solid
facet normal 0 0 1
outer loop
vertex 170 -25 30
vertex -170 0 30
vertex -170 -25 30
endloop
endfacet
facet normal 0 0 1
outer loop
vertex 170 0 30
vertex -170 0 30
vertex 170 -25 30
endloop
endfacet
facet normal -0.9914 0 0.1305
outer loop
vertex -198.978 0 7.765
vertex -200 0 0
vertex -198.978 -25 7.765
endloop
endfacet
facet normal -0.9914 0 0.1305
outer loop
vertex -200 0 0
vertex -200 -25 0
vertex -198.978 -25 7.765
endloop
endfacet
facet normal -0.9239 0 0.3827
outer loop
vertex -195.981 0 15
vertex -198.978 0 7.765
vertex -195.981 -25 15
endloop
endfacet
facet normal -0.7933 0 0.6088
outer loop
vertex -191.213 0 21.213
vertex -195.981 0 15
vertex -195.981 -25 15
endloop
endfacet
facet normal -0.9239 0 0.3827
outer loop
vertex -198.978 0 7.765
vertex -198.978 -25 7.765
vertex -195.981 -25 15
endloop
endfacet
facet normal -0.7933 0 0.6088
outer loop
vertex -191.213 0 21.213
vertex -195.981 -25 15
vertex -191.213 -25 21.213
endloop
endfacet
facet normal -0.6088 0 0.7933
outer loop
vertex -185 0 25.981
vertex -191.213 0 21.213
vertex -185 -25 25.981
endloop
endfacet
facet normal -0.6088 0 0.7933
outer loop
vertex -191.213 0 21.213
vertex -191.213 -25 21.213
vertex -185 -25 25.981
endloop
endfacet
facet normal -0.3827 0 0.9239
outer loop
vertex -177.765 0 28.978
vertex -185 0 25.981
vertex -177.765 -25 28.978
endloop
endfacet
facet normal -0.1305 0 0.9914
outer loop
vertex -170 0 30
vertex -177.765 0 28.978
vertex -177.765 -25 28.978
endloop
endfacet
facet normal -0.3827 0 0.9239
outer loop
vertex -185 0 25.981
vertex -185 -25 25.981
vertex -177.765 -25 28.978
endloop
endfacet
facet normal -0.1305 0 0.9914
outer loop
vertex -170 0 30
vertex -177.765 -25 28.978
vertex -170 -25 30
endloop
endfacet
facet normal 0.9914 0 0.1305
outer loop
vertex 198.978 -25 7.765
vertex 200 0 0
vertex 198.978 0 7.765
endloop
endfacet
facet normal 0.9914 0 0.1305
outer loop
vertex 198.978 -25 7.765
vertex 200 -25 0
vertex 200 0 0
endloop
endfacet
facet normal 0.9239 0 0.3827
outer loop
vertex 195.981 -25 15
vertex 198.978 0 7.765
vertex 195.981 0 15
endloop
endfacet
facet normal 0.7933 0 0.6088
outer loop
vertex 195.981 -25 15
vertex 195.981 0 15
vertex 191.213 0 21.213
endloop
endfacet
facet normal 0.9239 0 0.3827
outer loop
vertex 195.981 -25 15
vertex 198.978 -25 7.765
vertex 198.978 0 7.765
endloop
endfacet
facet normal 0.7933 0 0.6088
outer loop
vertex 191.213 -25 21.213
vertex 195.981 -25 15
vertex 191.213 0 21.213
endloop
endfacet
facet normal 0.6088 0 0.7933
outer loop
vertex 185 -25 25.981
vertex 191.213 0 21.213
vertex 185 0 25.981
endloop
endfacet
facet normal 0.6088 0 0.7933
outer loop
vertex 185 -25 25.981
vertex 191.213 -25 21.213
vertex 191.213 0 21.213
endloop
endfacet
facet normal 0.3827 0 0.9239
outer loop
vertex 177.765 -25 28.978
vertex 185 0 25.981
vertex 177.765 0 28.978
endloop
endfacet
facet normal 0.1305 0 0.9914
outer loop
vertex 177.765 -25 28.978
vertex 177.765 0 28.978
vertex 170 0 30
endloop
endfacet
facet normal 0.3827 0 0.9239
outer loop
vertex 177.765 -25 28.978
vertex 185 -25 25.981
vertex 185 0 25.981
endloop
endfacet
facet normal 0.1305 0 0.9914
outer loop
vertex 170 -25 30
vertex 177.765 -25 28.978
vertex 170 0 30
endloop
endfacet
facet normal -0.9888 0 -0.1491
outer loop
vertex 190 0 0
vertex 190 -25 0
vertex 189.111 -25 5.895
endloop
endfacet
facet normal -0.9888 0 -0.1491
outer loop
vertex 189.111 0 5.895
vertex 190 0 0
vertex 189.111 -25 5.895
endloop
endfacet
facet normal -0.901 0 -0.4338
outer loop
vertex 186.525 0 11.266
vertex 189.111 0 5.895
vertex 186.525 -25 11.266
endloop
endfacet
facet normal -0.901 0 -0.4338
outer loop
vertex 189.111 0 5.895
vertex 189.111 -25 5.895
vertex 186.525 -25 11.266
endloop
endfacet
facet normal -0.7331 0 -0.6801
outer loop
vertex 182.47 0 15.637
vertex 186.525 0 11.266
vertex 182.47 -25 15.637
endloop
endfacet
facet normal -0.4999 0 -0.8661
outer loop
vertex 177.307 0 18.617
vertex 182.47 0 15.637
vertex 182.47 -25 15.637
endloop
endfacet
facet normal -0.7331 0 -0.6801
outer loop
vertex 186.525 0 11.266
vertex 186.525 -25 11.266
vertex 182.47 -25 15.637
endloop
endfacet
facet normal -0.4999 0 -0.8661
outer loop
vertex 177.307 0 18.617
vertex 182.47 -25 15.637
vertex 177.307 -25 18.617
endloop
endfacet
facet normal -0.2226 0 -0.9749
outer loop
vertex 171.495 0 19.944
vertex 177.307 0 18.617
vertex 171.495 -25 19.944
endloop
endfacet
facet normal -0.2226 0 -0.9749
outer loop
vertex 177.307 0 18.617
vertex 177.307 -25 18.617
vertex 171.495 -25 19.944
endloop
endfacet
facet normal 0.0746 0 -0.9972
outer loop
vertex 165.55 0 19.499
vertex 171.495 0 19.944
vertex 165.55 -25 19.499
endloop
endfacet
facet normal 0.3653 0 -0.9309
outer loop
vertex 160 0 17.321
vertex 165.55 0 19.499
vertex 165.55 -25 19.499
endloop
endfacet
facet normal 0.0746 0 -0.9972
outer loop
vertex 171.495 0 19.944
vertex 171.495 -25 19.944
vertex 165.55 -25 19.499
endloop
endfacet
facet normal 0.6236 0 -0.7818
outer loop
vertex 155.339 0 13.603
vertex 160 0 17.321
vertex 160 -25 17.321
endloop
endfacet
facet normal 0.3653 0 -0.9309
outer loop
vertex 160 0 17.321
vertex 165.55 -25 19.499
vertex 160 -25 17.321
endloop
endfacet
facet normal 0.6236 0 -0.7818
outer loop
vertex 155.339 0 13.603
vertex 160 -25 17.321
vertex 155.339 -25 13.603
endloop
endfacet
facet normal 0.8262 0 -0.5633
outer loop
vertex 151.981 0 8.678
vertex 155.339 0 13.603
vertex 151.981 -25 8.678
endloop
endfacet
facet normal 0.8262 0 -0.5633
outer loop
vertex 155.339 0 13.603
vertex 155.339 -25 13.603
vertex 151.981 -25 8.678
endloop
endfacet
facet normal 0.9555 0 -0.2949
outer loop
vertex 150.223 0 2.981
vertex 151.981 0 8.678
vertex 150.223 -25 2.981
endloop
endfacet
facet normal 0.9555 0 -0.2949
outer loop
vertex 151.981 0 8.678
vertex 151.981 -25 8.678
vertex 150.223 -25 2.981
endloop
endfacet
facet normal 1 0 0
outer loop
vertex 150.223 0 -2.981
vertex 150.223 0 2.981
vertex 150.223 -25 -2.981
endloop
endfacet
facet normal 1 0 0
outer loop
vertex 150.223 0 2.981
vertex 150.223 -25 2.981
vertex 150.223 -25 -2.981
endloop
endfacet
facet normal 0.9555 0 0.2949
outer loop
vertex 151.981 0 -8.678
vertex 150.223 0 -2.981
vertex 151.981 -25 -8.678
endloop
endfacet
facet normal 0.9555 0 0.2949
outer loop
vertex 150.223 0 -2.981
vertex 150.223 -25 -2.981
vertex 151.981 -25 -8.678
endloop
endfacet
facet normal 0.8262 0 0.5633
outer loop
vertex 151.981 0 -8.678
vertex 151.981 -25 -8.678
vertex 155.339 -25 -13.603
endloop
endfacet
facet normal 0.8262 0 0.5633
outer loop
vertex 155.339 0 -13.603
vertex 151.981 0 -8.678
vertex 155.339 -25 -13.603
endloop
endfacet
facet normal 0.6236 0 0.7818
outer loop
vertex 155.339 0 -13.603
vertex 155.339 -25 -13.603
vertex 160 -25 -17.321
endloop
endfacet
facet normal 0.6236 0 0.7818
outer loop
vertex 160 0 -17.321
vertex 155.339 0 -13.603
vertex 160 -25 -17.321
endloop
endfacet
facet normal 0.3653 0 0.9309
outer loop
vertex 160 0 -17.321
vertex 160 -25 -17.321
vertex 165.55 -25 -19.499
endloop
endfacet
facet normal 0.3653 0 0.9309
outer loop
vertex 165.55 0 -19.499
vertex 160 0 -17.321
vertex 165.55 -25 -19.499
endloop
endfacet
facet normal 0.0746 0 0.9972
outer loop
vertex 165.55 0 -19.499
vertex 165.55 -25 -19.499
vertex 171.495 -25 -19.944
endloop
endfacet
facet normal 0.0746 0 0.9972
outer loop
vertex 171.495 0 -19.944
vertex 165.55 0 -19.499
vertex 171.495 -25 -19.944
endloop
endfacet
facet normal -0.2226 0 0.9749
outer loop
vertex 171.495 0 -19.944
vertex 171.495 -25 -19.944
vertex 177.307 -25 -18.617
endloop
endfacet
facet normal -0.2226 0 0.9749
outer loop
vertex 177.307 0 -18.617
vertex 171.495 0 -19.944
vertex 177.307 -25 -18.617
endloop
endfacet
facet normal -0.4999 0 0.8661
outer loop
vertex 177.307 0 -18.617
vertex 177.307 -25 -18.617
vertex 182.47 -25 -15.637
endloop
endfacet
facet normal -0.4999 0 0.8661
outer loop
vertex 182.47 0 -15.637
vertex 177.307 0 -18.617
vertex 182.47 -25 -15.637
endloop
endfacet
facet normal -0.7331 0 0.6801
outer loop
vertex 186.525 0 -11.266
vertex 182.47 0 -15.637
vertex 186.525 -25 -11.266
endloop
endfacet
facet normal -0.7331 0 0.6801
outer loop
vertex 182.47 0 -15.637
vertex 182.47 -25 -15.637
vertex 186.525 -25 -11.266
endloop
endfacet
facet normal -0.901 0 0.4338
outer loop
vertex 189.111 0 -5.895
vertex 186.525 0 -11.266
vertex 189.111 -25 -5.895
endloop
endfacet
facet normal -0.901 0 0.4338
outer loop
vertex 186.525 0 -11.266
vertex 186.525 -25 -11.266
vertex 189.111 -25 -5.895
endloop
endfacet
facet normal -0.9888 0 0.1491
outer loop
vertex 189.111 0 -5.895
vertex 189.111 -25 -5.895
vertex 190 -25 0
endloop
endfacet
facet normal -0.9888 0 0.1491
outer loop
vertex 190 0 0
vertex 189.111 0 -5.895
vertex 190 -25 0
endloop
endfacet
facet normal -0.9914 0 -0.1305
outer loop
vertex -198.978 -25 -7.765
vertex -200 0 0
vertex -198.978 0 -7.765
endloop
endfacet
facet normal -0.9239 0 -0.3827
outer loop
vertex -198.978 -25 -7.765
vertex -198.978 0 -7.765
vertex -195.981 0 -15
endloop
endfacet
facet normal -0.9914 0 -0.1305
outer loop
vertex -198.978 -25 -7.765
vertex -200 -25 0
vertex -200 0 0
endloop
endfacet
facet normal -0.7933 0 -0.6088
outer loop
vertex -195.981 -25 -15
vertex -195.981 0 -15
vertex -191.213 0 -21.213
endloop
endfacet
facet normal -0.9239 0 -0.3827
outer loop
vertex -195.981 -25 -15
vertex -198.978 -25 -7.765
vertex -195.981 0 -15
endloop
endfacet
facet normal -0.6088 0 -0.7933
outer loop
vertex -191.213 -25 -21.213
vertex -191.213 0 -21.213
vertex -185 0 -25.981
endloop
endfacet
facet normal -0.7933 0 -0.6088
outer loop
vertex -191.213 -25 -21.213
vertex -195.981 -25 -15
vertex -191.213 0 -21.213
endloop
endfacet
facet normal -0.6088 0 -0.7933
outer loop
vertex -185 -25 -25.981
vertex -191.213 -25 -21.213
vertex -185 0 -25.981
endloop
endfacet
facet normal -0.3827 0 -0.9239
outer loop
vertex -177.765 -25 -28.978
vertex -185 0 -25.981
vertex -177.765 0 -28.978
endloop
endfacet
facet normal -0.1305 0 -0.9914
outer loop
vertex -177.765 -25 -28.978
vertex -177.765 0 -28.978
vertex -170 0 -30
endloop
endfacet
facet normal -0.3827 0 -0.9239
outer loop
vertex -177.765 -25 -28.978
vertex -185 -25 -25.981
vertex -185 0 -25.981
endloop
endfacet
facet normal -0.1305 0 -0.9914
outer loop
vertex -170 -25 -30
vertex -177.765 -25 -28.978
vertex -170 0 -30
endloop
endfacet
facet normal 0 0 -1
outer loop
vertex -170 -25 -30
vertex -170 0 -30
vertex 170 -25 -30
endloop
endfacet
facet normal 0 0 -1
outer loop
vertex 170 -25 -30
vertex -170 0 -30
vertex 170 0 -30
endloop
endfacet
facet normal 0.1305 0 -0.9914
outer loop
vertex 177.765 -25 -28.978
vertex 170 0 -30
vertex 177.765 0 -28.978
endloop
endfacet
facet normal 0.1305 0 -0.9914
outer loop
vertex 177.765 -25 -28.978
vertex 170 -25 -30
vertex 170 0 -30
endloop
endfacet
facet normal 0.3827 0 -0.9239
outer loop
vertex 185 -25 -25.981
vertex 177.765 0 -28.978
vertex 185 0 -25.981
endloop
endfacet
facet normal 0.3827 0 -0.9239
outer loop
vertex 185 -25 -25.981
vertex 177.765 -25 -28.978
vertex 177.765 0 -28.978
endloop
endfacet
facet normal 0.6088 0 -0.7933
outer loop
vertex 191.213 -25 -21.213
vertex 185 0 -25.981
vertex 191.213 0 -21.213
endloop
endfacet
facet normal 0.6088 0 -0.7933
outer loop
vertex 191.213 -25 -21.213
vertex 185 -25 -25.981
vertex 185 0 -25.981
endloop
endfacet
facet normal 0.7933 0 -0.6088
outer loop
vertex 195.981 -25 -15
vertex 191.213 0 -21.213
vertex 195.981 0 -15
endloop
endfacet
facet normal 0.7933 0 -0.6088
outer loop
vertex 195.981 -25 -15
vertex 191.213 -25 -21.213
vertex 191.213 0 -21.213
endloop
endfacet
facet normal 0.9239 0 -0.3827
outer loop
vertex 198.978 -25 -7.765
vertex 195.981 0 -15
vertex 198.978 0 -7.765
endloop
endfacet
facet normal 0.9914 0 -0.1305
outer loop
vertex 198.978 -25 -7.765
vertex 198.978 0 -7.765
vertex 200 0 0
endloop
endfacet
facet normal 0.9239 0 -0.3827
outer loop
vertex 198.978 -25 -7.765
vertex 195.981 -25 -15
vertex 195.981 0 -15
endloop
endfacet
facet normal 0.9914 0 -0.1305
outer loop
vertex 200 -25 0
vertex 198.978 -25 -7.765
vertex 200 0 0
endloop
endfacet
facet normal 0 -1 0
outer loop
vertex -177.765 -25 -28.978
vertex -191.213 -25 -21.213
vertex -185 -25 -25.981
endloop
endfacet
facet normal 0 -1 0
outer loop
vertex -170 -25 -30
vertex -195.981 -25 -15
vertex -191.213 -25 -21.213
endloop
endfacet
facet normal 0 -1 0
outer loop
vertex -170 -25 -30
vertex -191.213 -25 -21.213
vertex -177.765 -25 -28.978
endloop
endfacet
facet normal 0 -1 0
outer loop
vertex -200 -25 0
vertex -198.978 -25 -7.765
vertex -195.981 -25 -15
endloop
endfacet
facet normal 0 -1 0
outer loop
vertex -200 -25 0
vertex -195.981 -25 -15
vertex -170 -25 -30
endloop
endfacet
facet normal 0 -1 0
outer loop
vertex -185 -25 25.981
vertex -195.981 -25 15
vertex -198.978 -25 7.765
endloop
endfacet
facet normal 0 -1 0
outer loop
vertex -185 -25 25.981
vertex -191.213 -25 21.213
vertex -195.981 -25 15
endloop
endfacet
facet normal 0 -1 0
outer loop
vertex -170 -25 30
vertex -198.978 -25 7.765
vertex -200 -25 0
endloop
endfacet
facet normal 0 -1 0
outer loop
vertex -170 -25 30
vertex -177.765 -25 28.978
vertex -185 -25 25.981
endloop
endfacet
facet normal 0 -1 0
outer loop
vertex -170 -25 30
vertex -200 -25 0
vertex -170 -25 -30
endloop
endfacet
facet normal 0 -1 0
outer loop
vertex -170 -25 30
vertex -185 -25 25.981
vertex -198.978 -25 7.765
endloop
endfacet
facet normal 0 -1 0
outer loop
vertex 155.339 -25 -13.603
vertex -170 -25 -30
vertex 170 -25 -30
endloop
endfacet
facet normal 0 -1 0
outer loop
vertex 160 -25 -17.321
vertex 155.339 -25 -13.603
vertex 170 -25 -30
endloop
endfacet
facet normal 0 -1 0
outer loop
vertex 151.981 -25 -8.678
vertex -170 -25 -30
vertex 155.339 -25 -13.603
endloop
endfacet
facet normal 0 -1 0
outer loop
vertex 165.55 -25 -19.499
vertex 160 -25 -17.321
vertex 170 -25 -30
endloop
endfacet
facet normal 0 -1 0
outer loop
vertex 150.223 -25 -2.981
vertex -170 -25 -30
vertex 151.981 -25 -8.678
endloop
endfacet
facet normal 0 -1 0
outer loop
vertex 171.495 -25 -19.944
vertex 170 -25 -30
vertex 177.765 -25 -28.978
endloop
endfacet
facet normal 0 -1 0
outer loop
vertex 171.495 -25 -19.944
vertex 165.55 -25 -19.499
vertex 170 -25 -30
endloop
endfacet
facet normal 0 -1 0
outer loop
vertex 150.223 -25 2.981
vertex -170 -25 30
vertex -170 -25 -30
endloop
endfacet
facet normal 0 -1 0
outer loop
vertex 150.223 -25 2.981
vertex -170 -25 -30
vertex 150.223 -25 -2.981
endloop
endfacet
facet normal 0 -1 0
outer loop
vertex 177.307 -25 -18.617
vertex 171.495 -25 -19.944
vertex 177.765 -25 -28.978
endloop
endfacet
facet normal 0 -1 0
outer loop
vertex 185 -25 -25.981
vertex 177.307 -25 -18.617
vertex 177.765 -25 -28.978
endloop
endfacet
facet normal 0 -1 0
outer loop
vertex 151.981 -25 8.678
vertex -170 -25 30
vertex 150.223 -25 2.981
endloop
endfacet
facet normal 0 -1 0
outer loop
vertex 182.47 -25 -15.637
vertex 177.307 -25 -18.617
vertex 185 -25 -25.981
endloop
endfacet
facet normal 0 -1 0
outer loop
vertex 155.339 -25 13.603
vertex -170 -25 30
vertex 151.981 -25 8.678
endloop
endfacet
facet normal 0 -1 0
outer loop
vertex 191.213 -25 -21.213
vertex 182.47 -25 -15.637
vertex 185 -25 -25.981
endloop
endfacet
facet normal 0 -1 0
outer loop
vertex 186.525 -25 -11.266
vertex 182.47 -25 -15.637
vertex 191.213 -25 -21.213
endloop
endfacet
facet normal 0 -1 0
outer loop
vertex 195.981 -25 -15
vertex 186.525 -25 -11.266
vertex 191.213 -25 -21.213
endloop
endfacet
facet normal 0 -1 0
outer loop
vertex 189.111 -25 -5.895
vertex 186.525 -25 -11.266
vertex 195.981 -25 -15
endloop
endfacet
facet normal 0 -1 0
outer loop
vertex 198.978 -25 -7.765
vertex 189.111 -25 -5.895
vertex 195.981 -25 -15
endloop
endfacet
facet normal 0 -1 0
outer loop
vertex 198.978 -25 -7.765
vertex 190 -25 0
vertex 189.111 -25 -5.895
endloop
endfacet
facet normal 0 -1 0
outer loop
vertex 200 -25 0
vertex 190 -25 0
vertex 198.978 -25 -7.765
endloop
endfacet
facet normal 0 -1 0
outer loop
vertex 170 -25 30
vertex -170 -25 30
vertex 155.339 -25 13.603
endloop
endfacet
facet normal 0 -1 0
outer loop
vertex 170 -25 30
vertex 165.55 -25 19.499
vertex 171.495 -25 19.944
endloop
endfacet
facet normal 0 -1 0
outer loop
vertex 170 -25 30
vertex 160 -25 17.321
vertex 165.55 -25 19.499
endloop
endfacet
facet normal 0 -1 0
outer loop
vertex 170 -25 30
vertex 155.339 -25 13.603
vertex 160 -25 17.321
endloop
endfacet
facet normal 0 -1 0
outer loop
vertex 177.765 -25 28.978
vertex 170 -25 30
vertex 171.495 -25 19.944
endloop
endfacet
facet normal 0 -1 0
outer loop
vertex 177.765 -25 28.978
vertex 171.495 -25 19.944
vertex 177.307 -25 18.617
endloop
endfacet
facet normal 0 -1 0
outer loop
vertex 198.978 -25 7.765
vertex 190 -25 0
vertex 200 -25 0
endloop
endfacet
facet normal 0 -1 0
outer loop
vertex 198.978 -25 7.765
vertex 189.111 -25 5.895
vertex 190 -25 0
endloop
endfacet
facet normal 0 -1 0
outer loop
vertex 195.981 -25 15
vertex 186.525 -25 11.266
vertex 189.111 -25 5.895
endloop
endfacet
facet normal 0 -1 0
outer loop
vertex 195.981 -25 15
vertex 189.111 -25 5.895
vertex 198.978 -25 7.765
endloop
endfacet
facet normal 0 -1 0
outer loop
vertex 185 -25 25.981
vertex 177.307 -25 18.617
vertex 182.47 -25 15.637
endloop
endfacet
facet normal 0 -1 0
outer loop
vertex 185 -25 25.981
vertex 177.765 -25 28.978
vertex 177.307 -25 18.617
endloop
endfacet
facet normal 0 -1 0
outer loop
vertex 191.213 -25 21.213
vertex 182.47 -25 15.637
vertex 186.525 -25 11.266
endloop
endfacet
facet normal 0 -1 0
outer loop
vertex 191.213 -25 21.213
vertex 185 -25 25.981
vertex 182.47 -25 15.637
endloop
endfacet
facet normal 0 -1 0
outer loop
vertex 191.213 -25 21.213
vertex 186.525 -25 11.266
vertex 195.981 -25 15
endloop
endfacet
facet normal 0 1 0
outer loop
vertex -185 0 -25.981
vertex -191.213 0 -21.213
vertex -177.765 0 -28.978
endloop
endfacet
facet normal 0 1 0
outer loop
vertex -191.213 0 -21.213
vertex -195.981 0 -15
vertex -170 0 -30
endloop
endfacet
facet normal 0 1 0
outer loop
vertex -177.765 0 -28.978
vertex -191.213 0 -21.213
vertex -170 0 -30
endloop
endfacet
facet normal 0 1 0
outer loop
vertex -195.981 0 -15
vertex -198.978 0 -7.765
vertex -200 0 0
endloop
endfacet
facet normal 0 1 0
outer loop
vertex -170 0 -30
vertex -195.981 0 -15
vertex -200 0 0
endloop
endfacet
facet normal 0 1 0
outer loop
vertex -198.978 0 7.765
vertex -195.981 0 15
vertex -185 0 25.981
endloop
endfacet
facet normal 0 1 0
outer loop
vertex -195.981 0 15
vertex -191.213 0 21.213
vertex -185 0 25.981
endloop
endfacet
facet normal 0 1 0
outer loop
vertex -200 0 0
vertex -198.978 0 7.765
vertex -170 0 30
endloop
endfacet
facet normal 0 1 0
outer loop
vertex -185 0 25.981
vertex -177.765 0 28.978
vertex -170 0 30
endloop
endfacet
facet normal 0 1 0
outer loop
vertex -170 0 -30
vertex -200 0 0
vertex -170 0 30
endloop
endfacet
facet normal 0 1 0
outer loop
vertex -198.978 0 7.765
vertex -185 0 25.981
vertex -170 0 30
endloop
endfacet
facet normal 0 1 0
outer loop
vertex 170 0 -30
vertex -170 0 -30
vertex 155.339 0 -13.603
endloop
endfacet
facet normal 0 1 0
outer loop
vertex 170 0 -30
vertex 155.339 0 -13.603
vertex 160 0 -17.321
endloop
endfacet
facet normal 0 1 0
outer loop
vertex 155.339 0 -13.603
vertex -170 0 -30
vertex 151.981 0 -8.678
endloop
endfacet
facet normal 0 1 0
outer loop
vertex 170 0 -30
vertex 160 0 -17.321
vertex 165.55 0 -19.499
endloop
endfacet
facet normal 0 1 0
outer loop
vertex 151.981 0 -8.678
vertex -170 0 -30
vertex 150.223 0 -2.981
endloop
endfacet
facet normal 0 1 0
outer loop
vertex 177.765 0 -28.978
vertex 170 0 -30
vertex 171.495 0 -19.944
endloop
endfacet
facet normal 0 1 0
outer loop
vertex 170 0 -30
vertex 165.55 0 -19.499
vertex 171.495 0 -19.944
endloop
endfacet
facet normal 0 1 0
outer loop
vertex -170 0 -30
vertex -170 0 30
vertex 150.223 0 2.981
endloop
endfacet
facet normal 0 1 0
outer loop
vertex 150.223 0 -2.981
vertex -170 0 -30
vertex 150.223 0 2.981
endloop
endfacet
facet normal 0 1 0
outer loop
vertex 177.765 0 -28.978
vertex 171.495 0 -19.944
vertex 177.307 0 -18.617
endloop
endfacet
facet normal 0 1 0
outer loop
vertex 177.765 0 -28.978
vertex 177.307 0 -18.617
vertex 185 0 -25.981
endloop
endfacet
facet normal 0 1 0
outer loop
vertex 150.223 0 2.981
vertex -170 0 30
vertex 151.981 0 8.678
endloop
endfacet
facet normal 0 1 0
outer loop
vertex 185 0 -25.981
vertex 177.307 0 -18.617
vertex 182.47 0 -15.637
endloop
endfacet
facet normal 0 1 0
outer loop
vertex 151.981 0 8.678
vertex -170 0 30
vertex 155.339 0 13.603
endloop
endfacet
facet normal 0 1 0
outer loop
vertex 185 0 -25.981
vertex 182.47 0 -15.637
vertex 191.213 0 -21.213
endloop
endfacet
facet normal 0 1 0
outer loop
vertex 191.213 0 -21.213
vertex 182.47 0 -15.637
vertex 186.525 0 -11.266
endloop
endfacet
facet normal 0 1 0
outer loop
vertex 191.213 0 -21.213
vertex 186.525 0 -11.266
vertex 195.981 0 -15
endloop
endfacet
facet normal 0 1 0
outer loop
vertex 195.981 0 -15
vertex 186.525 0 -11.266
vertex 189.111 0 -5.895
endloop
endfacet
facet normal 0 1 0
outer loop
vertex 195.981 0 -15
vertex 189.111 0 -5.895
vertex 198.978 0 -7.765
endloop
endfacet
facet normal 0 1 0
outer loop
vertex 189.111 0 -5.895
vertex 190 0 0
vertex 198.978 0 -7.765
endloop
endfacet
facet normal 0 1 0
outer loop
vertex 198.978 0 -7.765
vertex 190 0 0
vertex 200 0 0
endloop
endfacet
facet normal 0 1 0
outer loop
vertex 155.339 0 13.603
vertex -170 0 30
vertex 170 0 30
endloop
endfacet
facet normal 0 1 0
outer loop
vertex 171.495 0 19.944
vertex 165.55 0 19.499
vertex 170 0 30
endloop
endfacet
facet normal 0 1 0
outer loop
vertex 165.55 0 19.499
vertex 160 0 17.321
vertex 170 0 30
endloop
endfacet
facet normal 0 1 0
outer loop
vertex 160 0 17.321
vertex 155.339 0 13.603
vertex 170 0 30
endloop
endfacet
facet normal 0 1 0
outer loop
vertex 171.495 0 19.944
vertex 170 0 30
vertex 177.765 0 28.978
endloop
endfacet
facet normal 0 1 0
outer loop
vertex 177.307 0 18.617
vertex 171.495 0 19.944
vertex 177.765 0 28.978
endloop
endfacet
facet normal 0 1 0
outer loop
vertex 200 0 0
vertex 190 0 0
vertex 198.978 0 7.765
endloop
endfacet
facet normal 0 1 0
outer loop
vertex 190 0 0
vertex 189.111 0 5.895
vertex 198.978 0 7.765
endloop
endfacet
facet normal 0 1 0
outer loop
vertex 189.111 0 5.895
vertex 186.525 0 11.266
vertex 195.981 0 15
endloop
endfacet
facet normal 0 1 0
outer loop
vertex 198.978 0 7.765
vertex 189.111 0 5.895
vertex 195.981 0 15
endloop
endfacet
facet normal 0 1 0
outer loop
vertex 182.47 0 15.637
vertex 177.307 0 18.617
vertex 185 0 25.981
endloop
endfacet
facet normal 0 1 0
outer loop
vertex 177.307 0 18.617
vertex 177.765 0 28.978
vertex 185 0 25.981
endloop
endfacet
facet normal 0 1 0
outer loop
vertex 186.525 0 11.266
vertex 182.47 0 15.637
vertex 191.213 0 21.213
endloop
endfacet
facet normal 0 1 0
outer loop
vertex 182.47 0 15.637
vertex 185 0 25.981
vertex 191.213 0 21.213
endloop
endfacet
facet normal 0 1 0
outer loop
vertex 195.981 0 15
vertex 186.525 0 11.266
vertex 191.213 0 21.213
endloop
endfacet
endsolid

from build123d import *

# Parameters (mm, degrees)
F0_W     = 400
F0_H     = 60
F1_DEPTH = 25
F2_R     = 29.99999
F4_DEPTH = 25


# Not quite as in the source:
# - a fillet or chamfer is up to 0.001 mm smaller than in the source, because OpenCascade refuses the exact size


with BuildPart() as f1:
    # F0 (on Front) → F1 (new body)
    with BuildSketch(Plane.XZ):
        Rectangle(F0_W, F0_H)
    extrude(amount=F1_DEPTH)

    # F2 (radius 30 in the source; OpenCascade refuses exactly that, so slightly less here)
    f2_edges = [f1.edges().sort_by_distance(p)[0] for p in [
        (-200, -12.5, 30),
        (-200, -12.5, -30),
        (200, -12.5, 30),
        (200, -12.5, -30),
    ]]
    fillet(f2_edges, radius=F2_R)

    # F3 (on face) → F4 (cut)
    with BuildSketch(Plane.XZ.offset(25)):
        with BuildLine():
            ThreePointArc((150, 0), (170, -20), (190, 0))
            ThreePointArc((190, 0), (170, 20), (150, 0))
        make_face()
    extrude(amount=-F4_DEPTH, mode=Mode.SUBTRACT)


solid = f1.part
